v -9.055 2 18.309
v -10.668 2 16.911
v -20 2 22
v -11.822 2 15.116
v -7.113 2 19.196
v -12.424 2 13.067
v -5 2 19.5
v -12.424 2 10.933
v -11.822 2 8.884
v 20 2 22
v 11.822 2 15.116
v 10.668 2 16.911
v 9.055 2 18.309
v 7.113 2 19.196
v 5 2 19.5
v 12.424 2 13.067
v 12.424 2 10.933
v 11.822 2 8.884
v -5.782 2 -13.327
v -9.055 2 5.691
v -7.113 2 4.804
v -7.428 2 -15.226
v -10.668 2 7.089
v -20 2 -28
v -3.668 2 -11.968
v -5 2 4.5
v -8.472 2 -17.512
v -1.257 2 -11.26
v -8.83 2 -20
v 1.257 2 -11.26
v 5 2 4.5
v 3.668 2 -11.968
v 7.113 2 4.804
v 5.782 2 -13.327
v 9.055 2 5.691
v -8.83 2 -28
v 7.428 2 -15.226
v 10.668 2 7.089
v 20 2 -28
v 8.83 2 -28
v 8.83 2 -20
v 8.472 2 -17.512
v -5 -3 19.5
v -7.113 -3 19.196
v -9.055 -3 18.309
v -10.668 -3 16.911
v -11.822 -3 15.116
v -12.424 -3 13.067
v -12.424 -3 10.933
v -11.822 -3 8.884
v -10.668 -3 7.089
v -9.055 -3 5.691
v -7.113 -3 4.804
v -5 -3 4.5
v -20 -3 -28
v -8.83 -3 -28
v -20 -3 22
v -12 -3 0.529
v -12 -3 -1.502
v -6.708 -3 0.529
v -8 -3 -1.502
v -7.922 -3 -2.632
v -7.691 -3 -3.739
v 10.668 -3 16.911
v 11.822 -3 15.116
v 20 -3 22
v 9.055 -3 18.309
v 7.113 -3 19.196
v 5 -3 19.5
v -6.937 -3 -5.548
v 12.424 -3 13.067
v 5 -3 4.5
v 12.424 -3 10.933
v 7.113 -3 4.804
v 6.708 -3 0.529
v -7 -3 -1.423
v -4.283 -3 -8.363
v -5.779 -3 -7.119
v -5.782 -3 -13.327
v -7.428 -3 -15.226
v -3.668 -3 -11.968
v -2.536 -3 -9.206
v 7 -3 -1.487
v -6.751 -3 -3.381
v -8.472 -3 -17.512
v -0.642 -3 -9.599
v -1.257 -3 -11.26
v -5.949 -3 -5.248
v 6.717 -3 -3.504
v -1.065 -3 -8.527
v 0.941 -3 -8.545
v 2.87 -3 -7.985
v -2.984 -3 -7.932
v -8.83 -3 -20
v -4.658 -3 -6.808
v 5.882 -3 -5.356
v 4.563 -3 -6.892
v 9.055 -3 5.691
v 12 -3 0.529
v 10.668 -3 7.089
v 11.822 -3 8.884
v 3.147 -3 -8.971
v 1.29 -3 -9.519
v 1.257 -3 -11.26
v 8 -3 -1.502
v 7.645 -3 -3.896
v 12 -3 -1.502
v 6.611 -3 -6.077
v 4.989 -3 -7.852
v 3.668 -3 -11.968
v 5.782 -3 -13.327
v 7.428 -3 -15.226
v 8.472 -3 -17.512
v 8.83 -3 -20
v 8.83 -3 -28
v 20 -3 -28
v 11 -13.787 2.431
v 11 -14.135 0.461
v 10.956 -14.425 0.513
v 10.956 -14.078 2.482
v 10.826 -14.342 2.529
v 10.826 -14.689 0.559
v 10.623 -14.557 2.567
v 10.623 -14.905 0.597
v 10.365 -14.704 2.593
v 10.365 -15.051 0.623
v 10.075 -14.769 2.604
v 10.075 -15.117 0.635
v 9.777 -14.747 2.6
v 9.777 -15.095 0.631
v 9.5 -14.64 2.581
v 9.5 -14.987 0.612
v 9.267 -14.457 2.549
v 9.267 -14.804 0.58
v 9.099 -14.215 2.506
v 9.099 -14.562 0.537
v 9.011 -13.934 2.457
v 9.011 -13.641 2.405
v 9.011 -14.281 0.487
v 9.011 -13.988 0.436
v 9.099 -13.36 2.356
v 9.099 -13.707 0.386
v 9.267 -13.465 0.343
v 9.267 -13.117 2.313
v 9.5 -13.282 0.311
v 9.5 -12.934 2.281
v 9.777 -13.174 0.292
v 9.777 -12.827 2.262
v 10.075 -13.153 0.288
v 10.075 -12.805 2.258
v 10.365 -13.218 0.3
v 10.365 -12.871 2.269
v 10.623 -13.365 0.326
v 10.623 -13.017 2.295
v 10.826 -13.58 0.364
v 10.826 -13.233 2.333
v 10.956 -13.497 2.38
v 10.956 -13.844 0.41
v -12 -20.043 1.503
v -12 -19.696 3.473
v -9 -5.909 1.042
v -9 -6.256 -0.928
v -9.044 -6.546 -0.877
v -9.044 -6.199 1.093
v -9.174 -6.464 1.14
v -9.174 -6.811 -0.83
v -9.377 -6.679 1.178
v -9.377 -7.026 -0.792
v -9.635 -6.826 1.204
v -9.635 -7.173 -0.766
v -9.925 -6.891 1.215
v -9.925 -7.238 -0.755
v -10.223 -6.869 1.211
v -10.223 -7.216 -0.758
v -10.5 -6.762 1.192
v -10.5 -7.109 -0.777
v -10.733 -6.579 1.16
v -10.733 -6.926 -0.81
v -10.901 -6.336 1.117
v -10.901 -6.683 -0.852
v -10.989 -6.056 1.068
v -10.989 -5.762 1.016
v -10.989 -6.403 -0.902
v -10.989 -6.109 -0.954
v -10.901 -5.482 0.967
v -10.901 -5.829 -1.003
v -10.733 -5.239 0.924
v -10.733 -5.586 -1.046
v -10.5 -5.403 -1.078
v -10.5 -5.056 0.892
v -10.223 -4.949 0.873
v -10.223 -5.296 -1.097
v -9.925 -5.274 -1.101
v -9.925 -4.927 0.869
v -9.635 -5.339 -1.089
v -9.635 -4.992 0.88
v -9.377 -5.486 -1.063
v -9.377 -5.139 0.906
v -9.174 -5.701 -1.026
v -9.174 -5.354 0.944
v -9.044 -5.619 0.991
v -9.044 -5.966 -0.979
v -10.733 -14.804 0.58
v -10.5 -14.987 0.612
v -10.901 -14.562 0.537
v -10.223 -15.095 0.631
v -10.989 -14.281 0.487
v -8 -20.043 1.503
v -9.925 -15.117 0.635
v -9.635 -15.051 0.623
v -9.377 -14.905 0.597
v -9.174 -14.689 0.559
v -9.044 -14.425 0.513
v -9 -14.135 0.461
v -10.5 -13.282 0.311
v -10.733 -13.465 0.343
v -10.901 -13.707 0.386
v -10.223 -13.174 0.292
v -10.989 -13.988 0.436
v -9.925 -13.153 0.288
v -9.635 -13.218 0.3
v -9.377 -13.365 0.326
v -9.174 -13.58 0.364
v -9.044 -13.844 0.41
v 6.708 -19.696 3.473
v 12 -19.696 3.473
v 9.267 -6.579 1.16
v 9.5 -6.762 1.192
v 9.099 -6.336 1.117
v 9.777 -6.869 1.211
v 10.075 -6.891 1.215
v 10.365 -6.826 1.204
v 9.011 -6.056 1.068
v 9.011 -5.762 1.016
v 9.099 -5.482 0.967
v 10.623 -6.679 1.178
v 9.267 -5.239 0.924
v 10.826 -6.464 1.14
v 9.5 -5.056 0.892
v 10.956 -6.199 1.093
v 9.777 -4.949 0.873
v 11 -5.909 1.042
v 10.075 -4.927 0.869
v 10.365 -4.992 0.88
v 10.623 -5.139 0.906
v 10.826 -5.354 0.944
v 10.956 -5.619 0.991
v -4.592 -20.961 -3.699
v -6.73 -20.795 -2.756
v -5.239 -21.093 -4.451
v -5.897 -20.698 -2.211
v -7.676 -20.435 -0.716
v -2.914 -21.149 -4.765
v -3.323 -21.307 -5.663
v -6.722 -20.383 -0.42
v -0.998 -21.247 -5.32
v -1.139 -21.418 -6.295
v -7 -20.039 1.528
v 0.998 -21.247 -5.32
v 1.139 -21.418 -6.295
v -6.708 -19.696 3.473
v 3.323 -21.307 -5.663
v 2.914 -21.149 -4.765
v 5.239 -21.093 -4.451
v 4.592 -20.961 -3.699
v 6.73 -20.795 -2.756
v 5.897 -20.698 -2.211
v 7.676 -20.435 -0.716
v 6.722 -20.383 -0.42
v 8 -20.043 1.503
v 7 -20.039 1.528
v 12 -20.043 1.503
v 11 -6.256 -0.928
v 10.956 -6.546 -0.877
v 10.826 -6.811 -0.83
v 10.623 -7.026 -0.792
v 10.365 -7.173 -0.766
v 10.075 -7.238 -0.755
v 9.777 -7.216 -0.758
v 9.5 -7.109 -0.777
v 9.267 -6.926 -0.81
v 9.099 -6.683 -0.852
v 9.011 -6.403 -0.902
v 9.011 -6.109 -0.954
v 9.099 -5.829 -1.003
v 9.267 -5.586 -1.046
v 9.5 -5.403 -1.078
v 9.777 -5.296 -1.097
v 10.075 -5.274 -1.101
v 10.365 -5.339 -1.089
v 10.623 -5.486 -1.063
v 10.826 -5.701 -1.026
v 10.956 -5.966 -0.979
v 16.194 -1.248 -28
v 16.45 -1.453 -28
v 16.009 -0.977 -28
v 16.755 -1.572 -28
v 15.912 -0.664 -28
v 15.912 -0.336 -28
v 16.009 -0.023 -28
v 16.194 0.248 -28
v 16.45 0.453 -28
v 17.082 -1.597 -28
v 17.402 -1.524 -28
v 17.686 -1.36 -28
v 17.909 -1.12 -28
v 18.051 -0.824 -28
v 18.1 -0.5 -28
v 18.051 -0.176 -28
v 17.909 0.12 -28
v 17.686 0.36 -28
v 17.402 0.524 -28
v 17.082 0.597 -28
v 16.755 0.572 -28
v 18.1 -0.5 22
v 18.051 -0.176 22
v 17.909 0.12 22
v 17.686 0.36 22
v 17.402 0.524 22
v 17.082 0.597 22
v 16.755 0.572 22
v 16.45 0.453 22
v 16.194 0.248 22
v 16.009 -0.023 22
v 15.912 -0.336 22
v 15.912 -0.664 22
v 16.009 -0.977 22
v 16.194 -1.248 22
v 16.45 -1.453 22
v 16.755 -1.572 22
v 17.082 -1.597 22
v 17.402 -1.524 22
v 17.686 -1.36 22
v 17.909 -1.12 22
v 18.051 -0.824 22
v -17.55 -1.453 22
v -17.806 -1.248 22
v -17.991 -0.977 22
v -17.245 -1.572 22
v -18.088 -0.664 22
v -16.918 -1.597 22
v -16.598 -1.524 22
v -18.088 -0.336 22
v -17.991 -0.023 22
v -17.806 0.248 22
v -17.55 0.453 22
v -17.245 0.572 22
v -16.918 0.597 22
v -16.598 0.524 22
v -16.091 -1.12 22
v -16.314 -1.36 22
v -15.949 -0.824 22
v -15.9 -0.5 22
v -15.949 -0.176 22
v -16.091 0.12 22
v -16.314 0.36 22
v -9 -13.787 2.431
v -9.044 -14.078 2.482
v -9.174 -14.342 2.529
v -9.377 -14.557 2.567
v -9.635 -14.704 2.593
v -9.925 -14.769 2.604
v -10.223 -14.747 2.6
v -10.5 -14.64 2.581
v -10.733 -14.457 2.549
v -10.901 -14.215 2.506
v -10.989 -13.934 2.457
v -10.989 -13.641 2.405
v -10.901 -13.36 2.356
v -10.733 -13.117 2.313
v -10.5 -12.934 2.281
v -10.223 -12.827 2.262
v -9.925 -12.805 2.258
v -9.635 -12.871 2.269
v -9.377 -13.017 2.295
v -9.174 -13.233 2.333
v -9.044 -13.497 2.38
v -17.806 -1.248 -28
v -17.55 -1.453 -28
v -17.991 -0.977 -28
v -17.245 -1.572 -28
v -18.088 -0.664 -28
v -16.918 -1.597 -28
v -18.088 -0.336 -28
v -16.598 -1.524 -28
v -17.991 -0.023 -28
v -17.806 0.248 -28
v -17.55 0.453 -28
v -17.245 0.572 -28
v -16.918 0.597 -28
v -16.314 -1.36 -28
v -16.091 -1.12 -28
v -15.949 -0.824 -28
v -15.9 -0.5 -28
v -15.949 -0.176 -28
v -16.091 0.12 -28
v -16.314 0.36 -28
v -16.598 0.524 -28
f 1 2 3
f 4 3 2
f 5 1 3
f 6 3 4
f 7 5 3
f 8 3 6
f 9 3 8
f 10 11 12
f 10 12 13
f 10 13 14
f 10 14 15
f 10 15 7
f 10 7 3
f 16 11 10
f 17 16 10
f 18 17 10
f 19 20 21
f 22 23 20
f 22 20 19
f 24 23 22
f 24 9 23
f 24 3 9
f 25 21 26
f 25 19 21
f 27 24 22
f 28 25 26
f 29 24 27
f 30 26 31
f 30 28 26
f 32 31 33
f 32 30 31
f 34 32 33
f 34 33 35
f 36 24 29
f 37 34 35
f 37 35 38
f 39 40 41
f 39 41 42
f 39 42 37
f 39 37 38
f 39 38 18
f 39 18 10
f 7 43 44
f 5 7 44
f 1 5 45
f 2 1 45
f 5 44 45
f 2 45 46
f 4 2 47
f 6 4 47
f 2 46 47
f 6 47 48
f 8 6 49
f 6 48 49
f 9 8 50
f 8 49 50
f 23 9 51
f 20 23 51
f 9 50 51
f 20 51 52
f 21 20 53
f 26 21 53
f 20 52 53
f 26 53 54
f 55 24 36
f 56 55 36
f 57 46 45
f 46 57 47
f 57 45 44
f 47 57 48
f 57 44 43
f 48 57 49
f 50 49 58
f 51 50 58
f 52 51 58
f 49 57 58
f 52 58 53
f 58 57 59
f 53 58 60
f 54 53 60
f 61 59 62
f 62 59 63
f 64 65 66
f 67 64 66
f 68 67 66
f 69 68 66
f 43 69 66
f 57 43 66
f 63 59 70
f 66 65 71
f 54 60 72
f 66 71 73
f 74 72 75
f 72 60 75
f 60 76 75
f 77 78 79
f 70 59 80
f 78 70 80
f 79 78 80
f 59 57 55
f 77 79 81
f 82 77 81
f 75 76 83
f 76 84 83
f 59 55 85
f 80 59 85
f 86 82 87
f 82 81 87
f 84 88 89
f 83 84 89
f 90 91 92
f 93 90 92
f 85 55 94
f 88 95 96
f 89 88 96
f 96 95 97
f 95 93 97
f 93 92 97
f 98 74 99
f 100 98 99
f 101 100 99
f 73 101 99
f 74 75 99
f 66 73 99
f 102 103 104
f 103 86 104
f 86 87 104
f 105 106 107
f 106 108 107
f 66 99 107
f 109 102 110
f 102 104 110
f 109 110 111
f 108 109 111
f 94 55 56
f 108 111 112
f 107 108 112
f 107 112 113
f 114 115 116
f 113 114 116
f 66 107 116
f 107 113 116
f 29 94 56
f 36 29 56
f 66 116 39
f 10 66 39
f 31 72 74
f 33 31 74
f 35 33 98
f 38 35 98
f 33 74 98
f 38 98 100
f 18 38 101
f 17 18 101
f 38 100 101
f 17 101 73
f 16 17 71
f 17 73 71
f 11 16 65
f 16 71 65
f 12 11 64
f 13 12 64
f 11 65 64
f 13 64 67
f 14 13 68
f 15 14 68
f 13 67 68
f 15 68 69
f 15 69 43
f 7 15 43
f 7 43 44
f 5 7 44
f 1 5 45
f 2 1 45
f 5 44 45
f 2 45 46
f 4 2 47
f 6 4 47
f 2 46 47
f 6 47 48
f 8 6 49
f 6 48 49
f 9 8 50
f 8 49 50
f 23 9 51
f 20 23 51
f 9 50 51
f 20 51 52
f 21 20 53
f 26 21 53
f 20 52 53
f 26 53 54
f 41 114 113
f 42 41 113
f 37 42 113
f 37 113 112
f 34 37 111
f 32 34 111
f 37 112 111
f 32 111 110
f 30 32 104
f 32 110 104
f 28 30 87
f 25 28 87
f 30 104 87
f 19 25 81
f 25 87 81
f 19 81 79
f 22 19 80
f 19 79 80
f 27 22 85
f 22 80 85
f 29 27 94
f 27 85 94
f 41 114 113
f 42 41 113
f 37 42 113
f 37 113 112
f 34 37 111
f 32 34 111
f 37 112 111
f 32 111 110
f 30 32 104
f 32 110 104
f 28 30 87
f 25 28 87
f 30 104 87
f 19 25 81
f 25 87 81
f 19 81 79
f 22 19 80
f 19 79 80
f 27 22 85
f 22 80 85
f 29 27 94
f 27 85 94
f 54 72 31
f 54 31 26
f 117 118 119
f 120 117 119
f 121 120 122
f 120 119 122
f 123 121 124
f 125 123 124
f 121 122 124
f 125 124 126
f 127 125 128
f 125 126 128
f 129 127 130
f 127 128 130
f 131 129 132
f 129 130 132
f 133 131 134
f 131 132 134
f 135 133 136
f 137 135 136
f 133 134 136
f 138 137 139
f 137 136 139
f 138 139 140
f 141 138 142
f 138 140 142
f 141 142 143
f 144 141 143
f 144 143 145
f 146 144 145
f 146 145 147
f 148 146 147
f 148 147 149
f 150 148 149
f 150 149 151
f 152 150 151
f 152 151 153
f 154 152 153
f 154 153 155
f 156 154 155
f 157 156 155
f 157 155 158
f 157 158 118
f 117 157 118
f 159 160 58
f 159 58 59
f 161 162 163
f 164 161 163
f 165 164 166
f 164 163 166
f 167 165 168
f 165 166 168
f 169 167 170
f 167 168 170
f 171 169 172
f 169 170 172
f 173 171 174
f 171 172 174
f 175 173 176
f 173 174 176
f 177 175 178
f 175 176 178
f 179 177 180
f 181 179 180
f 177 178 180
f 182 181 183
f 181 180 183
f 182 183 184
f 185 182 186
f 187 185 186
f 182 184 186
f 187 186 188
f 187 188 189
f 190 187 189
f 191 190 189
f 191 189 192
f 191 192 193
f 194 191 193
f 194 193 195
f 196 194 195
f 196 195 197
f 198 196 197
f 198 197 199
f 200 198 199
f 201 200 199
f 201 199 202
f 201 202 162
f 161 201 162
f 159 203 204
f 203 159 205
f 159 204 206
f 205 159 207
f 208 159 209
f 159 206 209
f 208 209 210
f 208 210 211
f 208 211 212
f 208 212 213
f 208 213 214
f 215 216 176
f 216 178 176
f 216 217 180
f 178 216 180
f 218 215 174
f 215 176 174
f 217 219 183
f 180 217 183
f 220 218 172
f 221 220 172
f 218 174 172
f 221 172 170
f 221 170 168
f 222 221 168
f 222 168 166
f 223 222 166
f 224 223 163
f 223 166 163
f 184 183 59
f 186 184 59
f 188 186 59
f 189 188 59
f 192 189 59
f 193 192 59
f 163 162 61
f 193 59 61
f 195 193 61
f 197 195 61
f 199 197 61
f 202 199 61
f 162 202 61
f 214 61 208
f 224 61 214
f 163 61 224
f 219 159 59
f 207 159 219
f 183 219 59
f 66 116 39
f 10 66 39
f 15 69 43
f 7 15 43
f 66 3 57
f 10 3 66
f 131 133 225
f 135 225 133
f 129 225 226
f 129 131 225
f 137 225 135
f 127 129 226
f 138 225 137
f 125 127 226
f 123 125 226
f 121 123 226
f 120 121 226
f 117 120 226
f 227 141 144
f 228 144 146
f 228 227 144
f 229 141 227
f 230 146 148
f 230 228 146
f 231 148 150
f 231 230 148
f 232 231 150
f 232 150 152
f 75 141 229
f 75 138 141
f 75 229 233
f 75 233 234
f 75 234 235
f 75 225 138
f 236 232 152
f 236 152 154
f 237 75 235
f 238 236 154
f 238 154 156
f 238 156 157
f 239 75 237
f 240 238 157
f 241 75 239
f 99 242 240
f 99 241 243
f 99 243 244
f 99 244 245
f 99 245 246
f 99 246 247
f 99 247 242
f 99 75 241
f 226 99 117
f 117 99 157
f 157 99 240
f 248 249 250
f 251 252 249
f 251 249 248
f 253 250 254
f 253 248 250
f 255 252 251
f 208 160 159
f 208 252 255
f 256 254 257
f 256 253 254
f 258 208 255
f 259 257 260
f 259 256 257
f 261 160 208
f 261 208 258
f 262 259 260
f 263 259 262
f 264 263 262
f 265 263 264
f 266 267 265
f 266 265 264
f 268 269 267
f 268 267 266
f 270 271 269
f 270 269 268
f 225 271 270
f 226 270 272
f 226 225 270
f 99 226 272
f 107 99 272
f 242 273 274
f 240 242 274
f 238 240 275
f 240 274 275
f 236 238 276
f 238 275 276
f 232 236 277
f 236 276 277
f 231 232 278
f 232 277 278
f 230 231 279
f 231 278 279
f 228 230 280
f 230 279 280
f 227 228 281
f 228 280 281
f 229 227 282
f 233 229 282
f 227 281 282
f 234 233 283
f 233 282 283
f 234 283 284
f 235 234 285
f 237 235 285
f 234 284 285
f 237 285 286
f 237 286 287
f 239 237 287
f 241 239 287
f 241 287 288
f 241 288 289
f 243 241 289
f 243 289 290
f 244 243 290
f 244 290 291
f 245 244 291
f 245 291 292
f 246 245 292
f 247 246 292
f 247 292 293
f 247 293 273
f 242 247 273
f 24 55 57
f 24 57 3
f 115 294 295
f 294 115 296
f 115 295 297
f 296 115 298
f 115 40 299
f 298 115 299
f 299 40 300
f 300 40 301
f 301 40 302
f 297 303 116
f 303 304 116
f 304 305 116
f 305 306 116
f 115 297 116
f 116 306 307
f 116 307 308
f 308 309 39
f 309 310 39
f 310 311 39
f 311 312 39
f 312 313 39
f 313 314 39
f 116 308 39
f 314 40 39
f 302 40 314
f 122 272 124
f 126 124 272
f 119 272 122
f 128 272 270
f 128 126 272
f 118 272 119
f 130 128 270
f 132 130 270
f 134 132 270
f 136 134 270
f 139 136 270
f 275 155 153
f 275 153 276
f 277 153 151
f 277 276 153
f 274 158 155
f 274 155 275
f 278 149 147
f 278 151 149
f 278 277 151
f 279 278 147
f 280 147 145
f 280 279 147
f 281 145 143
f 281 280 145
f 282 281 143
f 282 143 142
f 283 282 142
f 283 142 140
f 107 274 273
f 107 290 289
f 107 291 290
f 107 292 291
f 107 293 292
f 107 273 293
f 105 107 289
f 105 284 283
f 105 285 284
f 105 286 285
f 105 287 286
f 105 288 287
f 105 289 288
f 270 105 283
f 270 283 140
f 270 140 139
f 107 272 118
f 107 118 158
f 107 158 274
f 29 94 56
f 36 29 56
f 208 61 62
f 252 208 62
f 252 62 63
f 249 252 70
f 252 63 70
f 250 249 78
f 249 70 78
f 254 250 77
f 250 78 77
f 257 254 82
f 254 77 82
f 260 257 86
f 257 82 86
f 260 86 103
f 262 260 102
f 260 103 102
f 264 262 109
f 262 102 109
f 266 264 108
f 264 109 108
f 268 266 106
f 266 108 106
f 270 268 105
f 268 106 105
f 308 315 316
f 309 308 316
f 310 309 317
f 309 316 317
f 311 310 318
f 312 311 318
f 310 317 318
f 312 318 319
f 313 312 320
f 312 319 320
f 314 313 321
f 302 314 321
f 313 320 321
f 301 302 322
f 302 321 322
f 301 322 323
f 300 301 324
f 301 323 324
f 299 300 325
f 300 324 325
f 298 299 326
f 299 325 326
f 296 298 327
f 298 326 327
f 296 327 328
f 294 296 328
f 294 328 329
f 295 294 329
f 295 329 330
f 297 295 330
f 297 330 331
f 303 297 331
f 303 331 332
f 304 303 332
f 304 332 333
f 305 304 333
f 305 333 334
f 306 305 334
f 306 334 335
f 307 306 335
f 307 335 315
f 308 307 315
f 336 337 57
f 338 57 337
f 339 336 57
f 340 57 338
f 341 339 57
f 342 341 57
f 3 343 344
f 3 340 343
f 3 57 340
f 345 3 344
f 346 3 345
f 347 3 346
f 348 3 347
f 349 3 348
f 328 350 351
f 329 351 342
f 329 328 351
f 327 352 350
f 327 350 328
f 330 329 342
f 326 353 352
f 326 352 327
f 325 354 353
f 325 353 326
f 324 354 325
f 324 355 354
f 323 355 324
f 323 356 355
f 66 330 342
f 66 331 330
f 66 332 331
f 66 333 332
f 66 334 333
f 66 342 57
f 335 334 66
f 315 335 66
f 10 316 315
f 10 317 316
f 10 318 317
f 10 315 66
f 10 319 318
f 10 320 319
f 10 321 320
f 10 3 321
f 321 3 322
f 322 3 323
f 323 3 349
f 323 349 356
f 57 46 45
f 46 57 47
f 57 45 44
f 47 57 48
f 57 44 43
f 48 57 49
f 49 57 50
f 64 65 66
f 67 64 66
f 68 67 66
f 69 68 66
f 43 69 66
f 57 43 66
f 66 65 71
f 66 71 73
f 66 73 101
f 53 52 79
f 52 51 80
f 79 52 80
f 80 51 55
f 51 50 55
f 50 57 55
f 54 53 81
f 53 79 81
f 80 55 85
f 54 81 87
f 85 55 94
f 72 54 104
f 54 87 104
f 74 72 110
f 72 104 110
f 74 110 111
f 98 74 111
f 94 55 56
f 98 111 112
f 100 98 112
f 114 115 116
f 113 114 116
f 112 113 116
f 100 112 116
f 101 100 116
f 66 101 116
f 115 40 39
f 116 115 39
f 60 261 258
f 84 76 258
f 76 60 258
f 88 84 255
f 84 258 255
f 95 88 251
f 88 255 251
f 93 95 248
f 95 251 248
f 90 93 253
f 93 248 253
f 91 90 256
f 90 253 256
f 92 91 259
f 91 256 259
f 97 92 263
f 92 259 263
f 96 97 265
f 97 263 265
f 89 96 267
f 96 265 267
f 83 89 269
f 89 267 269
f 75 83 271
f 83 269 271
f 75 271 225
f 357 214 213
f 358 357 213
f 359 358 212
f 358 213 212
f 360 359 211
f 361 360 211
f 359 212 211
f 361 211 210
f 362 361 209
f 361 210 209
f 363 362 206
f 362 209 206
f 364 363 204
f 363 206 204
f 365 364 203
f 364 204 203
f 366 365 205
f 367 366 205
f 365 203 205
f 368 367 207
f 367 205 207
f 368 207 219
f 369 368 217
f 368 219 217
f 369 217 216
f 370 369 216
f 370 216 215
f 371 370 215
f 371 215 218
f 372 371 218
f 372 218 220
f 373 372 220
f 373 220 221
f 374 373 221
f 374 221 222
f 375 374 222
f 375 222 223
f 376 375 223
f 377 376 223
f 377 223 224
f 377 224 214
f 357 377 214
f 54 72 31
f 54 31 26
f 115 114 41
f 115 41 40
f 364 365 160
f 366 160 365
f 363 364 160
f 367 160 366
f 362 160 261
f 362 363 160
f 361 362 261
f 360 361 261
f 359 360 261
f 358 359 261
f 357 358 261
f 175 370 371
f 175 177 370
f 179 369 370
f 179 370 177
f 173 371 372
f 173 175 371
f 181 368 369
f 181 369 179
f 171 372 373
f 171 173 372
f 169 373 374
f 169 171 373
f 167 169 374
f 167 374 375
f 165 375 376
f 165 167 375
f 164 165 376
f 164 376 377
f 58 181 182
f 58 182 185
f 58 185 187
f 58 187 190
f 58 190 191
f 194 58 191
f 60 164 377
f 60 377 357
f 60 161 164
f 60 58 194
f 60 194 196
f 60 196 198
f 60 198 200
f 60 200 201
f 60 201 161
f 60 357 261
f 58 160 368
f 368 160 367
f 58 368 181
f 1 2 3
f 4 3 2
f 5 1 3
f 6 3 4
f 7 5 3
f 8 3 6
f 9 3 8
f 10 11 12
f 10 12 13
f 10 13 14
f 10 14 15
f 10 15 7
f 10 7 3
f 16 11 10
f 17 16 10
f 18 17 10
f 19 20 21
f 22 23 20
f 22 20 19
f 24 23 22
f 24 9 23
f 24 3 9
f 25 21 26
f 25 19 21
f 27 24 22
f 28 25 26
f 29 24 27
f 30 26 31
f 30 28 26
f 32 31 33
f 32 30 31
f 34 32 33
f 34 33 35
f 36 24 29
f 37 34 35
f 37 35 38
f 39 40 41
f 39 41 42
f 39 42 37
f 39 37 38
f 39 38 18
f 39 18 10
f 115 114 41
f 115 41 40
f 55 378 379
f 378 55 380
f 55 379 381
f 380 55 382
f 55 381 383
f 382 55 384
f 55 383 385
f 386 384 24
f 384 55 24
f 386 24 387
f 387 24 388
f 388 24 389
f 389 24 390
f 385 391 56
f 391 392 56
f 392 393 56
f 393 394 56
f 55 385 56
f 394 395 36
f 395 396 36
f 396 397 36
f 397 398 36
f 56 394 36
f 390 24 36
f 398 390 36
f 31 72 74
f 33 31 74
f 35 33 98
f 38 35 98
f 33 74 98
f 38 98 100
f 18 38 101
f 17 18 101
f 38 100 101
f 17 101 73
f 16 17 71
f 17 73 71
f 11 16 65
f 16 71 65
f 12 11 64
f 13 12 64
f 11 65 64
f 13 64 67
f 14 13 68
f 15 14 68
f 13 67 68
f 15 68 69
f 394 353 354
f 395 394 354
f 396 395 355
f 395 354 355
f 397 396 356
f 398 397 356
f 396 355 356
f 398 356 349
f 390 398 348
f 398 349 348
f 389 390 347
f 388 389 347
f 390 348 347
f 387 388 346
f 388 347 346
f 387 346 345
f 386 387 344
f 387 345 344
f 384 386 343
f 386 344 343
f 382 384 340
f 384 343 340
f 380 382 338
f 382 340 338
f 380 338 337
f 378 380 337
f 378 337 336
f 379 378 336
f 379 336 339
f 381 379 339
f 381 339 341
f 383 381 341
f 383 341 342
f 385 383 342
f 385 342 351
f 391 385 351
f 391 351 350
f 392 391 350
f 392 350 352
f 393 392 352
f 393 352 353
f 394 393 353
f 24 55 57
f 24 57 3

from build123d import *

# Parameters (mm, degrees)
BOX_W           = 40
BOX_H           = 5
BOX_DEPTH       = 50
POCKET003_DEPTH = 5.001
PAD_DEPTH       = 20
POCKET_DEPTH    = 21.711101
SKETCH002_R     = 1
POCKET001_DEPTH = 5.421201
POCKET002_DEPTH = 24.001
SKETCH006_R     = 1.1
POCKET004_DEPTH = 50.001


with BuildPart() as pocket003:
    # Box → Box (new body)
    with BuildSketch(Plane(origin=(-20, -3, -28), x_dir=(1, 0, 0), z_dir=(0, 0, 1))):
        with Locations((20, 2.5)):
            Rectangle(BOX_W, BOX_H)
    extrude(amount=BOX_DEPTH)

    # Sketch005 → Pocket003 (cut, through all)
    with BuildSketch(Plane(origin=(-20, -3, -28), x_dir=(1, 0, 0), z_dir=(0, -1, 0))):
        with BuildLine():
            ThreePointArc((25, 32.5), (32.5, 40), (25, 47.5))
            Line((25, 47.5), (15, 47.5))
            ThreePointArc((15, 47.5), (7.5, 40), (15, 32.5))
            Line((25, 32.5), (15, 32.5))
        make_face()
        with BuildLine():
            ThreePointArc((28.82985, 8), (20, 16.82985), (11.17015, 8))
            Line((11.17015, 8), (11.17015, 0))
            Line((11.17015, 0), (28.82985, 0))
            Line((28.82985, 8), (28.82985, 0))
        make_face()
    extrude(amount=-POCKET003_DEPTH, mode=Mode.SUBTRACT)


with BuildPart() as fusion001:
    # Sketch → Pad (new body)
    with BuildSketch(Plane(origin=(0, 0, 0), x_dir=(1, 0, 0), z_dir=(0, -0.984808, 0.173648))):
        with BuildLine():
            Line((-12, 0), (-12, -2))
            Line((-12, -2), (-8, -2))
            ThreePointArc((-8, -2), (0, -10), (8, -2))
            Line((12, -2), (8, -2))
            Line((12, 0), (12, -2))
            Line((-12, 0), (12, 0))
        make_face()
    extrude(amount=PAD_DEPTH)

    # Sketch001 → Pocket (cut, through all)
    with BuildSketch(Plane(origin=(0, -19.696155, 3.472964), x_dir=(1, 0, 0), z_dir=(0, -0.984808, 0.173648))):
        with BuildLine():
            ThreePointArc((-6.708204, 0), (0, -9), (6.708204, 0))
            Line((-6.708204, 0), (6.708204, 0))
        make_face()
    extrude(amount=-POCKET_DEPTH, mode=Mode.SUBTRACT)

    # Sketch002 → Pocket001 (cut, through all)
    with BuildSketch(Plane(origin=(0, -0.347296, -1.969616), x_dir=(1, 0, 0), z_dir=(0, -0.173648, -0.984808))):
        with Locations((-10, 14)):
            Circle(SKETCH002_R)
        with Locations((-10, 6)):
            Circle(SKETCH002_R)
        with Locations((10, 14)):
            Circle(SKETCH002_R)
        with Locations((10, 6)):
            Circle(SKETCH002_R)
    extrude(amount=-POCKET001_DEPTH, mode=Mode.SUBTRACT)

    # Sketch003 → Pocket002 (cut, through all)
    with BuildSketch(Plane(origin=(12, 0, 0), x_dir=(0, 0.173648, 0.984808), z_dir=(1, 0, 0))):
        Polygon((-10, 0), (0, 1.76327), (0, 0), align=None)
    extrude(amount=-POCKET002_DEPTH, mode=Mode.SUBTRACT)

    # Fusion001: union Pocket003
    add(pocket003.part)


with BuildPart() as pocket004:
    # Pocket004 base: copy of Pocket003
    add(pocket003.part)

    # Sketch006 → Pocket004 (cut, through all)
    with BuildSketch(Plane(origin=(-20, -3, 22), x_dir=(1, 0, 0), z_dir=(0, 0, 1))):
        with Locations((3, 2.5)):
            Circle(SKETCH006_R)
        with Locations((37, 2.5)):
            Circle(SKETCH006_R)
    extrude(amount=-POCKET004_DEPTH, mode=Mode.SUBTRACT)


solid = Compound([fusion001.part, pocket004.part])
